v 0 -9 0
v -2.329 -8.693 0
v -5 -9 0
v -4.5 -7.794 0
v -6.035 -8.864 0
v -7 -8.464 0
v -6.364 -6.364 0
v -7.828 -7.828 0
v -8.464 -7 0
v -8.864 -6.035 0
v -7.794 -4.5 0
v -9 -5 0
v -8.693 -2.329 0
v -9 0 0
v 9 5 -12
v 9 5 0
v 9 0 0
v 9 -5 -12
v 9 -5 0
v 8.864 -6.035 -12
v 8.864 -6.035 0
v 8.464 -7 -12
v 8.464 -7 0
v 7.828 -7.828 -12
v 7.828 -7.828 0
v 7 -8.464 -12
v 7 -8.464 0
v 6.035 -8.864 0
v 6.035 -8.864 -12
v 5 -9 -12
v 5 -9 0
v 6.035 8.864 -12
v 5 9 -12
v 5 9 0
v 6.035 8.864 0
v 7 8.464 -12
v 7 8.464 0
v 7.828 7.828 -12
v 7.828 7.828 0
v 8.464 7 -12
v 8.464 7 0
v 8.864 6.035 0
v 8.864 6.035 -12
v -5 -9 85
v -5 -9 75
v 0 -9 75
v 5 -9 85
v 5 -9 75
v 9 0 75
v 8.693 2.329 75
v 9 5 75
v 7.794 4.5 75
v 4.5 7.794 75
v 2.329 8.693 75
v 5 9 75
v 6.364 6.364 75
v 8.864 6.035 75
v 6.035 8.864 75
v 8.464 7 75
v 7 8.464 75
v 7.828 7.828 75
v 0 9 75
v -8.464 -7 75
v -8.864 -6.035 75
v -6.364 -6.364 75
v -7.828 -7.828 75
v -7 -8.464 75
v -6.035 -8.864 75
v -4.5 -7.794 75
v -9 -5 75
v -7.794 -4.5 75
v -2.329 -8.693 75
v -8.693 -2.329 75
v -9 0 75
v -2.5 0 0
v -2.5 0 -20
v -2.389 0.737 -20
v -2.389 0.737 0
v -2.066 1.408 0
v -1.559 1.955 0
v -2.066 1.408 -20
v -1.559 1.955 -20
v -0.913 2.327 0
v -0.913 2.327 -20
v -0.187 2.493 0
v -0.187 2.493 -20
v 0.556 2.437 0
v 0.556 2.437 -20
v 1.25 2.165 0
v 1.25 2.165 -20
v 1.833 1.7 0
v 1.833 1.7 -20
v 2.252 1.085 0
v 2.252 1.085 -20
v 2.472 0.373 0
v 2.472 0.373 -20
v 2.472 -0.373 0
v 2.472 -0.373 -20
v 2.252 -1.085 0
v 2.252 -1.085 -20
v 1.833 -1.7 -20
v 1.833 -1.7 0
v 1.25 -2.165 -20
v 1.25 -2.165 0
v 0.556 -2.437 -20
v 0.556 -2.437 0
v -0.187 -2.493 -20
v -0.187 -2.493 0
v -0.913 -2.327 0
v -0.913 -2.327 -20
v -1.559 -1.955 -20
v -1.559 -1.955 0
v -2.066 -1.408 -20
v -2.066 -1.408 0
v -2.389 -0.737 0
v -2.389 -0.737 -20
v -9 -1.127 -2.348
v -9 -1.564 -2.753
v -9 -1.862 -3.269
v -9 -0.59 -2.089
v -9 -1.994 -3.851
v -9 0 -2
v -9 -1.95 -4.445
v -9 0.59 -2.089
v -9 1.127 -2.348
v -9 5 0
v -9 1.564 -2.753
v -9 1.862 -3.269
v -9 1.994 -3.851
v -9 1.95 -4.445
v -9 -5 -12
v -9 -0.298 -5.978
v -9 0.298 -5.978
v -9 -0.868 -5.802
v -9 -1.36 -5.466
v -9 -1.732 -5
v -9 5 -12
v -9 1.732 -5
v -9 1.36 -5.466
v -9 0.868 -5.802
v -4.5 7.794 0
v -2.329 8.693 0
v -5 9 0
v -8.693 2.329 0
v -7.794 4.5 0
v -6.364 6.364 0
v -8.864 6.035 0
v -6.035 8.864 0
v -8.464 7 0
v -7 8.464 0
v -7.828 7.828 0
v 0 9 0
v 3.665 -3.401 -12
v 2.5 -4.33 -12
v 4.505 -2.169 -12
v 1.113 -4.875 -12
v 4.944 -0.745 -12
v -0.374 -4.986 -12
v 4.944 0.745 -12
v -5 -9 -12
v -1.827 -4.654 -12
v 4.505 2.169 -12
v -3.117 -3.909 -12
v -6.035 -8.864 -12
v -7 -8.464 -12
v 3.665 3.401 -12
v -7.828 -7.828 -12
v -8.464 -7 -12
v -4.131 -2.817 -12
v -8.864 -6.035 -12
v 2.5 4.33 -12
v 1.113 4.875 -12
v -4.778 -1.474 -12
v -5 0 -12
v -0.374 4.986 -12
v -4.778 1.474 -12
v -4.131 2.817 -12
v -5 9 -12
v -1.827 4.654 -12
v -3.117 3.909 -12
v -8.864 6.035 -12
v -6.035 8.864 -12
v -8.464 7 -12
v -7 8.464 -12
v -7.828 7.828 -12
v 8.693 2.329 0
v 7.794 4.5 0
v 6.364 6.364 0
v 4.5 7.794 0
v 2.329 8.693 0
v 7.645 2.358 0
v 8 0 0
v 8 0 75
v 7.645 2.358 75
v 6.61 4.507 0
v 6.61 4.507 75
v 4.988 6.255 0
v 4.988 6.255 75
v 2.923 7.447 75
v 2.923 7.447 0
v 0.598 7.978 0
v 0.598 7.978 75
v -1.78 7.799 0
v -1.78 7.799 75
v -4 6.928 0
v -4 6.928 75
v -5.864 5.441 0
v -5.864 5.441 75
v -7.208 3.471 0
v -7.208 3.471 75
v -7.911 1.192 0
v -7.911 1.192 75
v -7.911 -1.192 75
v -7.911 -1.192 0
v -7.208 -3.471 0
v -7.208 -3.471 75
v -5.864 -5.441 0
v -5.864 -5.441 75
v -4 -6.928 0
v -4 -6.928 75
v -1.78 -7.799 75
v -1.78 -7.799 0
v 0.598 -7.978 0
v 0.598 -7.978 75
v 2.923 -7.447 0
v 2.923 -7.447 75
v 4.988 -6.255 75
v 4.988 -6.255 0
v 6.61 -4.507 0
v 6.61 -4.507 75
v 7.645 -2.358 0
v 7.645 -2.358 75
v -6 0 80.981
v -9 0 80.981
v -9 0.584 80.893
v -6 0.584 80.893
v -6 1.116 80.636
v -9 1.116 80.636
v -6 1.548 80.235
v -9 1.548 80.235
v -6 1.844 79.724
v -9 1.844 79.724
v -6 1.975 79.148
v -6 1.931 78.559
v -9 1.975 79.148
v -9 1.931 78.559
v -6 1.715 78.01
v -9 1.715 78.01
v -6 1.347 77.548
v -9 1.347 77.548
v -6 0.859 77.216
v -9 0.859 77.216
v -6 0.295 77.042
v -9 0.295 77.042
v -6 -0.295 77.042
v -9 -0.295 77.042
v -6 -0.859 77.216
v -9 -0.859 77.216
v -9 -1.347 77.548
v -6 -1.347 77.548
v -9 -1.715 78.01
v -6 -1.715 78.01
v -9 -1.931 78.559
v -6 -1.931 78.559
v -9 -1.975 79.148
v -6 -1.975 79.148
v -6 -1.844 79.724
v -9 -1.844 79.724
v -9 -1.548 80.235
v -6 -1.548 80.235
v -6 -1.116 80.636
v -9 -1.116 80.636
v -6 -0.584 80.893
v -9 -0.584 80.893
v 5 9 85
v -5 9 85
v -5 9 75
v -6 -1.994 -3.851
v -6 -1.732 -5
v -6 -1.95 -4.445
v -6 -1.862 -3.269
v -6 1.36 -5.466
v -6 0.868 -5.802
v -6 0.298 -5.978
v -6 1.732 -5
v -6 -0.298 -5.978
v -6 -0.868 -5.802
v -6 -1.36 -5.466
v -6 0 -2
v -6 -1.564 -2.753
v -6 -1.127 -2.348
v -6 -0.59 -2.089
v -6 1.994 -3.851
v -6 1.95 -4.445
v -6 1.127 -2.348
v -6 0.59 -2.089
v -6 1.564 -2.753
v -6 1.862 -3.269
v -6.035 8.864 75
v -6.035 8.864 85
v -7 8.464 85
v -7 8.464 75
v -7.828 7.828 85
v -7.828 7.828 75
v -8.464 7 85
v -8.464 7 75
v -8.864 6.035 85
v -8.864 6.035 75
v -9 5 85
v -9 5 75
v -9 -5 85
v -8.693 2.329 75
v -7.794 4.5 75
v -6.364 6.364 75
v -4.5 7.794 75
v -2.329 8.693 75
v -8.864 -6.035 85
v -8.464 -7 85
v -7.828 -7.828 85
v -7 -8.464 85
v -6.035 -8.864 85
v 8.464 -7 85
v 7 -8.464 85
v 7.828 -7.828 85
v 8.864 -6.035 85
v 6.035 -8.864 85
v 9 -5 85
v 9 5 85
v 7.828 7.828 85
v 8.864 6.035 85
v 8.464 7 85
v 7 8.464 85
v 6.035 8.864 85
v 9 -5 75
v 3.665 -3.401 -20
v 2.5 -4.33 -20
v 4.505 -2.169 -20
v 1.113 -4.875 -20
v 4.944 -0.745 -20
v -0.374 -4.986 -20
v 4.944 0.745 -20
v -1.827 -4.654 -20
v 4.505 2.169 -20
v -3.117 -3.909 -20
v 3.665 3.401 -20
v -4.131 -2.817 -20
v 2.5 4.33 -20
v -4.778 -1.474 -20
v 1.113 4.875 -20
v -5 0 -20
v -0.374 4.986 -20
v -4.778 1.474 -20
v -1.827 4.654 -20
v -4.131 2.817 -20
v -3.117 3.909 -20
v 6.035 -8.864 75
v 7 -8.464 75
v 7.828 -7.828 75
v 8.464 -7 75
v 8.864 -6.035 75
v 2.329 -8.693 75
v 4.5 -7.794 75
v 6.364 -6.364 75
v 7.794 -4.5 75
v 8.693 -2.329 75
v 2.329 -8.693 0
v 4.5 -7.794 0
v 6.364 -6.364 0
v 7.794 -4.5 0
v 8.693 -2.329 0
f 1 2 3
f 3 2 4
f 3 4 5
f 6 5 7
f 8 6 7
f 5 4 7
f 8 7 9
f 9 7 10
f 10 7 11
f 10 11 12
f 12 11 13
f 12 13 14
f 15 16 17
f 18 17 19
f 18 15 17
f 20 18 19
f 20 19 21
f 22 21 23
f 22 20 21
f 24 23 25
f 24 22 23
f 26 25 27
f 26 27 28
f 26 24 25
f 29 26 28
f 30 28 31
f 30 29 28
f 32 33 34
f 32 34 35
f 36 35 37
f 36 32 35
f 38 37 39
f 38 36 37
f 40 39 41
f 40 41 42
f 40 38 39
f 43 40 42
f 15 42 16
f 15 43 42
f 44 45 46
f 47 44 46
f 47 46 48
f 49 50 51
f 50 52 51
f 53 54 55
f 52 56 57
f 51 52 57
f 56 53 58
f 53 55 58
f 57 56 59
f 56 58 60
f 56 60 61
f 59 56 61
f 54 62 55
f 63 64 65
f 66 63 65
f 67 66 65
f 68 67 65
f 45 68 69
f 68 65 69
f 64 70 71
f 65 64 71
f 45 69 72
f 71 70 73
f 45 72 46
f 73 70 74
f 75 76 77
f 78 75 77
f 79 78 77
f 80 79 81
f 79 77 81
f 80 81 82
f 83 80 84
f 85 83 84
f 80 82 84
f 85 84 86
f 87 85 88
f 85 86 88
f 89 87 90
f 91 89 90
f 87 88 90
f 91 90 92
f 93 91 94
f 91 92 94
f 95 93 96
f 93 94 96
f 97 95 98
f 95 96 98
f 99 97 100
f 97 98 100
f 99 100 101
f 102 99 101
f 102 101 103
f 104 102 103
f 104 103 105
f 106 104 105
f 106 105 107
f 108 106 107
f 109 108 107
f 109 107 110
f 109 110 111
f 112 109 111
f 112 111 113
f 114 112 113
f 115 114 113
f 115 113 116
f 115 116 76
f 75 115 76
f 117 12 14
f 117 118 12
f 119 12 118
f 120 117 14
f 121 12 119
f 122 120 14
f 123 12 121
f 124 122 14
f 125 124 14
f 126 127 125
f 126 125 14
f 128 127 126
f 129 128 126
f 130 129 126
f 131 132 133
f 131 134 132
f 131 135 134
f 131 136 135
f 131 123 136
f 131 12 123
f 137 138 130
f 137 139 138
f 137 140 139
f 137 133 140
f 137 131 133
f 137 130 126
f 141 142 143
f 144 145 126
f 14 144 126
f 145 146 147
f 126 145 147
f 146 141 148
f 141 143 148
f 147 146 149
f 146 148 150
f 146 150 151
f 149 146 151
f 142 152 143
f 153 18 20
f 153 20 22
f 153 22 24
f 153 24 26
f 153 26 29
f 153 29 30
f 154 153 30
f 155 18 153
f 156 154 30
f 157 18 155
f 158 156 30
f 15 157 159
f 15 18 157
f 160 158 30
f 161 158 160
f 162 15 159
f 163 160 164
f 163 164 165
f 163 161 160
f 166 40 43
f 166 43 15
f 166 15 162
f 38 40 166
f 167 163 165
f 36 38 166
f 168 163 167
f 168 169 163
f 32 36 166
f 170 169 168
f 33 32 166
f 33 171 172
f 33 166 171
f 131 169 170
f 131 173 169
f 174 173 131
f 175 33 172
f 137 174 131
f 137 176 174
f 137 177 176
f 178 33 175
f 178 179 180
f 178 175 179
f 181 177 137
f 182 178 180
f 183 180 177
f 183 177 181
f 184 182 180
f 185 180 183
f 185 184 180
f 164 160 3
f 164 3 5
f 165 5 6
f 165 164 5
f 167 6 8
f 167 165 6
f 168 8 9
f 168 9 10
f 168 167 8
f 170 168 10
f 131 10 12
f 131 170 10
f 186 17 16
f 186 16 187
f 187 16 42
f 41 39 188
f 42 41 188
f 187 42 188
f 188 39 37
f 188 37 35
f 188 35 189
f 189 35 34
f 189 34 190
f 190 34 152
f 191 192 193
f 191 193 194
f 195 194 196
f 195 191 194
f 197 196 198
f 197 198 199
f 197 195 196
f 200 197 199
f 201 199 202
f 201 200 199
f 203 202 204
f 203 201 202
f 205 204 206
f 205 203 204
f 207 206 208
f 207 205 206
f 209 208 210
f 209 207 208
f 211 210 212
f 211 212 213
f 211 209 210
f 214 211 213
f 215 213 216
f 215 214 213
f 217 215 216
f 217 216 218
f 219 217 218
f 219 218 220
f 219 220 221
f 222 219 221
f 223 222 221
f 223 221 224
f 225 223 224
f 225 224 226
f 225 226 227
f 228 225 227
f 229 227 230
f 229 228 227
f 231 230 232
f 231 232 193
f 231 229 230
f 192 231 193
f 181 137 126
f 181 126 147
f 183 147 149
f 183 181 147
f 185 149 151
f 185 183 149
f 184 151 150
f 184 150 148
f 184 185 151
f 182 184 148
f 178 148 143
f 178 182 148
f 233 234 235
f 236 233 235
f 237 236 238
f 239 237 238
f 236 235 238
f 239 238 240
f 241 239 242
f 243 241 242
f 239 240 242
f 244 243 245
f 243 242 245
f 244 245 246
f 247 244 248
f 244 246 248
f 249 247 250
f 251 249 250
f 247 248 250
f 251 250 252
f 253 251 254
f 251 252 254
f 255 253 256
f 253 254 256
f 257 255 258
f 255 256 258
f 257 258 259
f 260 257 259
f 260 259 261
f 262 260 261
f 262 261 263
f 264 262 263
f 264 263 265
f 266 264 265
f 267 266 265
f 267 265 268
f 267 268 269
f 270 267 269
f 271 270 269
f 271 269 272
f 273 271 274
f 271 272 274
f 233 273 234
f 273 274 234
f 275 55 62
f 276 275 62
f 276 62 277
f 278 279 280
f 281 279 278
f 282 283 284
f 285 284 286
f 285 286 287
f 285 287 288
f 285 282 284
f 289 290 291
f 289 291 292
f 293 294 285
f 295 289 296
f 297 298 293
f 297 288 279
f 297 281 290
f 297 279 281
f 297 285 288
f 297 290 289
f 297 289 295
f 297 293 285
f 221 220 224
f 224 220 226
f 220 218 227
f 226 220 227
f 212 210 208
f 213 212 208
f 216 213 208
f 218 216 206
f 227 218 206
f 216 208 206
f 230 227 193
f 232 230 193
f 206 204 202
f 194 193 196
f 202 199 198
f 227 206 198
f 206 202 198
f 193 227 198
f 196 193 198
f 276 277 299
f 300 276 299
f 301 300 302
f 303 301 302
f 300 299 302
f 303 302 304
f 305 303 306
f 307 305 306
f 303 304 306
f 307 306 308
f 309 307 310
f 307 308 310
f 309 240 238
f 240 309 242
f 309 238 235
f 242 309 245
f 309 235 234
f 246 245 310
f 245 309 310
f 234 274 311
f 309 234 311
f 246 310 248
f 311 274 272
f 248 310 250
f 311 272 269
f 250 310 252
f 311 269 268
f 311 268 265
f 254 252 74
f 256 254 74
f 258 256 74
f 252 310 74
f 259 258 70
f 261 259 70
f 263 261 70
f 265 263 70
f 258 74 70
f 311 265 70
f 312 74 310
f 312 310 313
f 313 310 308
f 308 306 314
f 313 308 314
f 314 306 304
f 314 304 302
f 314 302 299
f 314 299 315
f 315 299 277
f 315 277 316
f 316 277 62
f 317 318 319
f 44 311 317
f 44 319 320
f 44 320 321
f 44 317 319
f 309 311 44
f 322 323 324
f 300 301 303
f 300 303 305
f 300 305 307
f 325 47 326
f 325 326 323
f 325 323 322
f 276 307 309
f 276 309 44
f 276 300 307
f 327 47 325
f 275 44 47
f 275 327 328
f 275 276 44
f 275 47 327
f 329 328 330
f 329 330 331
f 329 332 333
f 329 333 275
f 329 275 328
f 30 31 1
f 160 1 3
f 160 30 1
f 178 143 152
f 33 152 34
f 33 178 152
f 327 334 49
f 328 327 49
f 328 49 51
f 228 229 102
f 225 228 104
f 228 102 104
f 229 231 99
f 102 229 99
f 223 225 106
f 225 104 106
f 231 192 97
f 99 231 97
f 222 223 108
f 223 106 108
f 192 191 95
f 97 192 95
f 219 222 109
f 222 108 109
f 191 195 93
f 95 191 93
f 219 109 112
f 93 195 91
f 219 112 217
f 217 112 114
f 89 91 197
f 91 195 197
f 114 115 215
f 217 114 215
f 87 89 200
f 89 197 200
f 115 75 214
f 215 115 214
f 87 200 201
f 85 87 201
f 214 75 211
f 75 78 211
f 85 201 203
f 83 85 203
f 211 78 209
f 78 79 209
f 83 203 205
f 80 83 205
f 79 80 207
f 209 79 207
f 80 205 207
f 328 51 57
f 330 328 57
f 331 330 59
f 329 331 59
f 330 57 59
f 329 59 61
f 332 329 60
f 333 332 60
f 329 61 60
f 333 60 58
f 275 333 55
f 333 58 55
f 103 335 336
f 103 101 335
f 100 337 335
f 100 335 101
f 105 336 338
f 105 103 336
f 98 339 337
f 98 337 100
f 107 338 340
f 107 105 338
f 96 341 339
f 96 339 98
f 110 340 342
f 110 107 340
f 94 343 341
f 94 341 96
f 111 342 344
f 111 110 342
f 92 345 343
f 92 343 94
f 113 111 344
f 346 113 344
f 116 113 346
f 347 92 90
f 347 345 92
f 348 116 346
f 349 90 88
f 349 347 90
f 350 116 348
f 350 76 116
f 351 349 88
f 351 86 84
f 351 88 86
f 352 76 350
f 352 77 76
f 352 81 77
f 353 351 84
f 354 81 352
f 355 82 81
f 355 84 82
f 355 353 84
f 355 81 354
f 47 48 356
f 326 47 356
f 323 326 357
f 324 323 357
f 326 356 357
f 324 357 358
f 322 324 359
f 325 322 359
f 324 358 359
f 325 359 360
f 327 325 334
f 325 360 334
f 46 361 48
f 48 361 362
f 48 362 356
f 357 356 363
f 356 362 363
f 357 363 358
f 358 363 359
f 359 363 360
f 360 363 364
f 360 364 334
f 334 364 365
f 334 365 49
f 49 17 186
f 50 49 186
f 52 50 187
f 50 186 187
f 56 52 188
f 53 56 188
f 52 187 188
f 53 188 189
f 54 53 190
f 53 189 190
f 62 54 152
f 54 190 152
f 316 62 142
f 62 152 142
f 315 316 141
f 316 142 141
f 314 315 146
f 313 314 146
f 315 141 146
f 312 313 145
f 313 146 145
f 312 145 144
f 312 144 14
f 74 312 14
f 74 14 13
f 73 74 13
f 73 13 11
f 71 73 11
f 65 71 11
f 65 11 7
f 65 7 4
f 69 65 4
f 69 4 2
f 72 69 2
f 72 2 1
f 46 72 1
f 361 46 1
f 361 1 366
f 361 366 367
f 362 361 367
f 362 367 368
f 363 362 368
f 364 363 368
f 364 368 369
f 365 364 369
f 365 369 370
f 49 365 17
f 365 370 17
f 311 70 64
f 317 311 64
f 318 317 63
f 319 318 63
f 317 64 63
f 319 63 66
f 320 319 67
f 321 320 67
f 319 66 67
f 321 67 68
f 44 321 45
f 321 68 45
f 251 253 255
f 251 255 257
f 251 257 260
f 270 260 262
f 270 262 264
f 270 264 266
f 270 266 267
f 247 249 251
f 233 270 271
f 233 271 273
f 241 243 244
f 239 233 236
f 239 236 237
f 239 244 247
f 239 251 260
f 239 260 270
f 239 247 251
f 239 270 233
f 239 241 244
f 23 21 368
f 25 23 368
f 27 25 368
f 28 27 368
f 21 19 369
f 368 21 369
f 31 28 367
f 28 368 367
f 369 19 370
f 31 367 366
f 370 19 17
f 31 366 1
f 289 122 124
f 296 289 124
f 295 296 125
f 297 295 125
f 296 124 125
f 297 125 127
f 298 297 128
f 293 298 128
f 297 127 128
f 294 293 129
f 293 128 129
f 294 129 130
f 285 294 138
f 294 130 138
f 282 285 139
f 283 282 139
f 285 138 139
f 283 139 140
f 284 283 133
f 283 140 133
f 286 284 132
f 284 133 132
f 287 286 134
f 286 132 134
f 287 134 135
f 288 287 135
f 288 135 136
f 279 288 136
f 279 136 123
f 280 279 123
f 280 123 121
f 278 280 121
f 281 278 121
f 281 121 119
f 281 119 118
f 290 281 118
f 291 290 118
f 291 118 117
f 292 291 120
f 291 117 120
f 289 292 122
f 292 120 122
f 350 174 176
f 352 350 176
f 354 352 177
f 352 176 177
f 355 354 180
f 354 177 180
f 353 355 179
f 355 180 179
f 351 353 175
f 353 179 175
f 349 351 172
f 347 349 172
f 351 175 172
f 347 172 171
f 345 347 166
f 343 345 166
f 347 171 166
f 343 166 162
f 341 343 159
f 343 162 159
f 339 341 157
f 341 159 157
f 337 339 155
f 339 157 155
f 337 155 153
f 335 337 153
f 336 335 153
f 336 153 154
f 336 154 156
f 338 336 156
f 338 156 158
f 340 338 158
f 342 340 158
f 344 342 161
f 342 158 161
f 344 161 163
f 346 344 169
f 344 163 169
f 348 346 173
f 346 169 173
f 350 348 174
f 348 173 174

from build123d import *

# Parameters (mm, degrees)
SKETCH_1_R          = 9
SKETCH_1_R_2        = 8
EXTRUDE_1_DEPTH     = 75
EXTRUDE_2_DEPTH     = 10
EXTRUDE_START       = 12
EXTRUDE_3_DEPTH     = 12
SKETCH_4_R          = 5
EXTRUDE_4_DEPTH     = 8
SKETCH_5_R          = 2.5
CUT_EXTRUDE_1_DEPTH = 38
SKETCH_6_R          = 2
SKETCH_6_R_2        = 1.980516498
CUT_EXTRUDE_3_DEPTH = 3


with BuildPart() as part:
    # 草图1 → 凸台-拉伸1 (new body)
    with BuildSketch(Plane.XY):
        Circle(SKETCH_1_R)
        Circle(SKETCH_1_R_2, mode=Mode.SUBTRACT)
    extrude(amount=EXTRUDE_1_DEPTH)

    # 草图2 → 凸台-拉伸2 (add)
    with BuildSketch(Plane.XY.offset(75)):
        with BuildLine():
            Line((-5, -9), (5, -9))
            ThreePointArc((5, -9), (7.828427125, -7.828427125), (9, -5))
            Line((9, -5), (9, 5))
            ThreePointArc((9, 5), (7.828427125, 7.828427125), (5, 9))
            Line((5, 9), (-5, 9))
            ThreePointArc((-5, 9), (-7.828427125, 7.828427125), (-9, 5))
            Line((-9, 5), (-9, -5))
            ThreePointArc((-9, -5), (-7.828427125, -7.828427125), (-5, -9))
        make_face()
    extrude(amount=EXTRUDE_2_DEPTH)

    # 草图3 → 凸台-拉伸3 (add)
    with BuildSketch(Plane(origin=(0, 0, 0), x_dir=(-1, 0, 0), z_dir=(0, 0, -1)).offset(EXTRUDE_START)):
        with BuildLine():
            Line((-5, -9), (5, -9))
            ThreePointArc((5, -9), (7.828427125, -7.828427125), (9, -5))
            Line((9, -5), (9, 5))
            ThreePointArc((9, 5), (7.828427125, 7.828427125), (5, 9))
            Line((5, 9), (-5, 9))
            ThreePointArc((-5, 9), (-7.828427125, 7.828427125), (-9, 5))
            Line((-9, 5), (-9, -5))
            ThreePointArc((-9, -5), (-7.828427125, -7.828427125), (-5, -9))
        make_face()
    extrude(amount=-EXTRUDE_3_DEPTH)

    # 草图4 → 凸台-拉伸4 (add)
    with BuildSketch(Plane(origin=(0, 0, -12), x_dir=(-1, 0, 0), z_dir=(0, 0, -1))):
        Circle(SKETCH_4_R)
    extrude(amount=EXTRUDE_4_DEPTH)

    # 草图5 → 切除-拉伸1 (cut)
    with BuildSketch(Plane(origin=(0, 0, -20), x_dir=(-1, 0, 0), z_dir=(0, 0, -1))):
        Circle(SKETCH_5_R)
    extrude(amount=-CUT_EXTRUDE_1_DEPTH, mode=Mode.SUBTRACT)

    # 草图6 → 切除-拉伸3 (cut)
    with BuildSketch(Plane.ZY.offset(9)):
        with Locations((-4, 0)):
            Circle(SKETCH_6_R)
        with Locations((79, 0)):
            Circle(SKETCH_6_R_2)
    extrude(amount=-CUT_EXTRUDE_3_DEPTH, mode=Mode.SUBTRACT)


solid = part.part
